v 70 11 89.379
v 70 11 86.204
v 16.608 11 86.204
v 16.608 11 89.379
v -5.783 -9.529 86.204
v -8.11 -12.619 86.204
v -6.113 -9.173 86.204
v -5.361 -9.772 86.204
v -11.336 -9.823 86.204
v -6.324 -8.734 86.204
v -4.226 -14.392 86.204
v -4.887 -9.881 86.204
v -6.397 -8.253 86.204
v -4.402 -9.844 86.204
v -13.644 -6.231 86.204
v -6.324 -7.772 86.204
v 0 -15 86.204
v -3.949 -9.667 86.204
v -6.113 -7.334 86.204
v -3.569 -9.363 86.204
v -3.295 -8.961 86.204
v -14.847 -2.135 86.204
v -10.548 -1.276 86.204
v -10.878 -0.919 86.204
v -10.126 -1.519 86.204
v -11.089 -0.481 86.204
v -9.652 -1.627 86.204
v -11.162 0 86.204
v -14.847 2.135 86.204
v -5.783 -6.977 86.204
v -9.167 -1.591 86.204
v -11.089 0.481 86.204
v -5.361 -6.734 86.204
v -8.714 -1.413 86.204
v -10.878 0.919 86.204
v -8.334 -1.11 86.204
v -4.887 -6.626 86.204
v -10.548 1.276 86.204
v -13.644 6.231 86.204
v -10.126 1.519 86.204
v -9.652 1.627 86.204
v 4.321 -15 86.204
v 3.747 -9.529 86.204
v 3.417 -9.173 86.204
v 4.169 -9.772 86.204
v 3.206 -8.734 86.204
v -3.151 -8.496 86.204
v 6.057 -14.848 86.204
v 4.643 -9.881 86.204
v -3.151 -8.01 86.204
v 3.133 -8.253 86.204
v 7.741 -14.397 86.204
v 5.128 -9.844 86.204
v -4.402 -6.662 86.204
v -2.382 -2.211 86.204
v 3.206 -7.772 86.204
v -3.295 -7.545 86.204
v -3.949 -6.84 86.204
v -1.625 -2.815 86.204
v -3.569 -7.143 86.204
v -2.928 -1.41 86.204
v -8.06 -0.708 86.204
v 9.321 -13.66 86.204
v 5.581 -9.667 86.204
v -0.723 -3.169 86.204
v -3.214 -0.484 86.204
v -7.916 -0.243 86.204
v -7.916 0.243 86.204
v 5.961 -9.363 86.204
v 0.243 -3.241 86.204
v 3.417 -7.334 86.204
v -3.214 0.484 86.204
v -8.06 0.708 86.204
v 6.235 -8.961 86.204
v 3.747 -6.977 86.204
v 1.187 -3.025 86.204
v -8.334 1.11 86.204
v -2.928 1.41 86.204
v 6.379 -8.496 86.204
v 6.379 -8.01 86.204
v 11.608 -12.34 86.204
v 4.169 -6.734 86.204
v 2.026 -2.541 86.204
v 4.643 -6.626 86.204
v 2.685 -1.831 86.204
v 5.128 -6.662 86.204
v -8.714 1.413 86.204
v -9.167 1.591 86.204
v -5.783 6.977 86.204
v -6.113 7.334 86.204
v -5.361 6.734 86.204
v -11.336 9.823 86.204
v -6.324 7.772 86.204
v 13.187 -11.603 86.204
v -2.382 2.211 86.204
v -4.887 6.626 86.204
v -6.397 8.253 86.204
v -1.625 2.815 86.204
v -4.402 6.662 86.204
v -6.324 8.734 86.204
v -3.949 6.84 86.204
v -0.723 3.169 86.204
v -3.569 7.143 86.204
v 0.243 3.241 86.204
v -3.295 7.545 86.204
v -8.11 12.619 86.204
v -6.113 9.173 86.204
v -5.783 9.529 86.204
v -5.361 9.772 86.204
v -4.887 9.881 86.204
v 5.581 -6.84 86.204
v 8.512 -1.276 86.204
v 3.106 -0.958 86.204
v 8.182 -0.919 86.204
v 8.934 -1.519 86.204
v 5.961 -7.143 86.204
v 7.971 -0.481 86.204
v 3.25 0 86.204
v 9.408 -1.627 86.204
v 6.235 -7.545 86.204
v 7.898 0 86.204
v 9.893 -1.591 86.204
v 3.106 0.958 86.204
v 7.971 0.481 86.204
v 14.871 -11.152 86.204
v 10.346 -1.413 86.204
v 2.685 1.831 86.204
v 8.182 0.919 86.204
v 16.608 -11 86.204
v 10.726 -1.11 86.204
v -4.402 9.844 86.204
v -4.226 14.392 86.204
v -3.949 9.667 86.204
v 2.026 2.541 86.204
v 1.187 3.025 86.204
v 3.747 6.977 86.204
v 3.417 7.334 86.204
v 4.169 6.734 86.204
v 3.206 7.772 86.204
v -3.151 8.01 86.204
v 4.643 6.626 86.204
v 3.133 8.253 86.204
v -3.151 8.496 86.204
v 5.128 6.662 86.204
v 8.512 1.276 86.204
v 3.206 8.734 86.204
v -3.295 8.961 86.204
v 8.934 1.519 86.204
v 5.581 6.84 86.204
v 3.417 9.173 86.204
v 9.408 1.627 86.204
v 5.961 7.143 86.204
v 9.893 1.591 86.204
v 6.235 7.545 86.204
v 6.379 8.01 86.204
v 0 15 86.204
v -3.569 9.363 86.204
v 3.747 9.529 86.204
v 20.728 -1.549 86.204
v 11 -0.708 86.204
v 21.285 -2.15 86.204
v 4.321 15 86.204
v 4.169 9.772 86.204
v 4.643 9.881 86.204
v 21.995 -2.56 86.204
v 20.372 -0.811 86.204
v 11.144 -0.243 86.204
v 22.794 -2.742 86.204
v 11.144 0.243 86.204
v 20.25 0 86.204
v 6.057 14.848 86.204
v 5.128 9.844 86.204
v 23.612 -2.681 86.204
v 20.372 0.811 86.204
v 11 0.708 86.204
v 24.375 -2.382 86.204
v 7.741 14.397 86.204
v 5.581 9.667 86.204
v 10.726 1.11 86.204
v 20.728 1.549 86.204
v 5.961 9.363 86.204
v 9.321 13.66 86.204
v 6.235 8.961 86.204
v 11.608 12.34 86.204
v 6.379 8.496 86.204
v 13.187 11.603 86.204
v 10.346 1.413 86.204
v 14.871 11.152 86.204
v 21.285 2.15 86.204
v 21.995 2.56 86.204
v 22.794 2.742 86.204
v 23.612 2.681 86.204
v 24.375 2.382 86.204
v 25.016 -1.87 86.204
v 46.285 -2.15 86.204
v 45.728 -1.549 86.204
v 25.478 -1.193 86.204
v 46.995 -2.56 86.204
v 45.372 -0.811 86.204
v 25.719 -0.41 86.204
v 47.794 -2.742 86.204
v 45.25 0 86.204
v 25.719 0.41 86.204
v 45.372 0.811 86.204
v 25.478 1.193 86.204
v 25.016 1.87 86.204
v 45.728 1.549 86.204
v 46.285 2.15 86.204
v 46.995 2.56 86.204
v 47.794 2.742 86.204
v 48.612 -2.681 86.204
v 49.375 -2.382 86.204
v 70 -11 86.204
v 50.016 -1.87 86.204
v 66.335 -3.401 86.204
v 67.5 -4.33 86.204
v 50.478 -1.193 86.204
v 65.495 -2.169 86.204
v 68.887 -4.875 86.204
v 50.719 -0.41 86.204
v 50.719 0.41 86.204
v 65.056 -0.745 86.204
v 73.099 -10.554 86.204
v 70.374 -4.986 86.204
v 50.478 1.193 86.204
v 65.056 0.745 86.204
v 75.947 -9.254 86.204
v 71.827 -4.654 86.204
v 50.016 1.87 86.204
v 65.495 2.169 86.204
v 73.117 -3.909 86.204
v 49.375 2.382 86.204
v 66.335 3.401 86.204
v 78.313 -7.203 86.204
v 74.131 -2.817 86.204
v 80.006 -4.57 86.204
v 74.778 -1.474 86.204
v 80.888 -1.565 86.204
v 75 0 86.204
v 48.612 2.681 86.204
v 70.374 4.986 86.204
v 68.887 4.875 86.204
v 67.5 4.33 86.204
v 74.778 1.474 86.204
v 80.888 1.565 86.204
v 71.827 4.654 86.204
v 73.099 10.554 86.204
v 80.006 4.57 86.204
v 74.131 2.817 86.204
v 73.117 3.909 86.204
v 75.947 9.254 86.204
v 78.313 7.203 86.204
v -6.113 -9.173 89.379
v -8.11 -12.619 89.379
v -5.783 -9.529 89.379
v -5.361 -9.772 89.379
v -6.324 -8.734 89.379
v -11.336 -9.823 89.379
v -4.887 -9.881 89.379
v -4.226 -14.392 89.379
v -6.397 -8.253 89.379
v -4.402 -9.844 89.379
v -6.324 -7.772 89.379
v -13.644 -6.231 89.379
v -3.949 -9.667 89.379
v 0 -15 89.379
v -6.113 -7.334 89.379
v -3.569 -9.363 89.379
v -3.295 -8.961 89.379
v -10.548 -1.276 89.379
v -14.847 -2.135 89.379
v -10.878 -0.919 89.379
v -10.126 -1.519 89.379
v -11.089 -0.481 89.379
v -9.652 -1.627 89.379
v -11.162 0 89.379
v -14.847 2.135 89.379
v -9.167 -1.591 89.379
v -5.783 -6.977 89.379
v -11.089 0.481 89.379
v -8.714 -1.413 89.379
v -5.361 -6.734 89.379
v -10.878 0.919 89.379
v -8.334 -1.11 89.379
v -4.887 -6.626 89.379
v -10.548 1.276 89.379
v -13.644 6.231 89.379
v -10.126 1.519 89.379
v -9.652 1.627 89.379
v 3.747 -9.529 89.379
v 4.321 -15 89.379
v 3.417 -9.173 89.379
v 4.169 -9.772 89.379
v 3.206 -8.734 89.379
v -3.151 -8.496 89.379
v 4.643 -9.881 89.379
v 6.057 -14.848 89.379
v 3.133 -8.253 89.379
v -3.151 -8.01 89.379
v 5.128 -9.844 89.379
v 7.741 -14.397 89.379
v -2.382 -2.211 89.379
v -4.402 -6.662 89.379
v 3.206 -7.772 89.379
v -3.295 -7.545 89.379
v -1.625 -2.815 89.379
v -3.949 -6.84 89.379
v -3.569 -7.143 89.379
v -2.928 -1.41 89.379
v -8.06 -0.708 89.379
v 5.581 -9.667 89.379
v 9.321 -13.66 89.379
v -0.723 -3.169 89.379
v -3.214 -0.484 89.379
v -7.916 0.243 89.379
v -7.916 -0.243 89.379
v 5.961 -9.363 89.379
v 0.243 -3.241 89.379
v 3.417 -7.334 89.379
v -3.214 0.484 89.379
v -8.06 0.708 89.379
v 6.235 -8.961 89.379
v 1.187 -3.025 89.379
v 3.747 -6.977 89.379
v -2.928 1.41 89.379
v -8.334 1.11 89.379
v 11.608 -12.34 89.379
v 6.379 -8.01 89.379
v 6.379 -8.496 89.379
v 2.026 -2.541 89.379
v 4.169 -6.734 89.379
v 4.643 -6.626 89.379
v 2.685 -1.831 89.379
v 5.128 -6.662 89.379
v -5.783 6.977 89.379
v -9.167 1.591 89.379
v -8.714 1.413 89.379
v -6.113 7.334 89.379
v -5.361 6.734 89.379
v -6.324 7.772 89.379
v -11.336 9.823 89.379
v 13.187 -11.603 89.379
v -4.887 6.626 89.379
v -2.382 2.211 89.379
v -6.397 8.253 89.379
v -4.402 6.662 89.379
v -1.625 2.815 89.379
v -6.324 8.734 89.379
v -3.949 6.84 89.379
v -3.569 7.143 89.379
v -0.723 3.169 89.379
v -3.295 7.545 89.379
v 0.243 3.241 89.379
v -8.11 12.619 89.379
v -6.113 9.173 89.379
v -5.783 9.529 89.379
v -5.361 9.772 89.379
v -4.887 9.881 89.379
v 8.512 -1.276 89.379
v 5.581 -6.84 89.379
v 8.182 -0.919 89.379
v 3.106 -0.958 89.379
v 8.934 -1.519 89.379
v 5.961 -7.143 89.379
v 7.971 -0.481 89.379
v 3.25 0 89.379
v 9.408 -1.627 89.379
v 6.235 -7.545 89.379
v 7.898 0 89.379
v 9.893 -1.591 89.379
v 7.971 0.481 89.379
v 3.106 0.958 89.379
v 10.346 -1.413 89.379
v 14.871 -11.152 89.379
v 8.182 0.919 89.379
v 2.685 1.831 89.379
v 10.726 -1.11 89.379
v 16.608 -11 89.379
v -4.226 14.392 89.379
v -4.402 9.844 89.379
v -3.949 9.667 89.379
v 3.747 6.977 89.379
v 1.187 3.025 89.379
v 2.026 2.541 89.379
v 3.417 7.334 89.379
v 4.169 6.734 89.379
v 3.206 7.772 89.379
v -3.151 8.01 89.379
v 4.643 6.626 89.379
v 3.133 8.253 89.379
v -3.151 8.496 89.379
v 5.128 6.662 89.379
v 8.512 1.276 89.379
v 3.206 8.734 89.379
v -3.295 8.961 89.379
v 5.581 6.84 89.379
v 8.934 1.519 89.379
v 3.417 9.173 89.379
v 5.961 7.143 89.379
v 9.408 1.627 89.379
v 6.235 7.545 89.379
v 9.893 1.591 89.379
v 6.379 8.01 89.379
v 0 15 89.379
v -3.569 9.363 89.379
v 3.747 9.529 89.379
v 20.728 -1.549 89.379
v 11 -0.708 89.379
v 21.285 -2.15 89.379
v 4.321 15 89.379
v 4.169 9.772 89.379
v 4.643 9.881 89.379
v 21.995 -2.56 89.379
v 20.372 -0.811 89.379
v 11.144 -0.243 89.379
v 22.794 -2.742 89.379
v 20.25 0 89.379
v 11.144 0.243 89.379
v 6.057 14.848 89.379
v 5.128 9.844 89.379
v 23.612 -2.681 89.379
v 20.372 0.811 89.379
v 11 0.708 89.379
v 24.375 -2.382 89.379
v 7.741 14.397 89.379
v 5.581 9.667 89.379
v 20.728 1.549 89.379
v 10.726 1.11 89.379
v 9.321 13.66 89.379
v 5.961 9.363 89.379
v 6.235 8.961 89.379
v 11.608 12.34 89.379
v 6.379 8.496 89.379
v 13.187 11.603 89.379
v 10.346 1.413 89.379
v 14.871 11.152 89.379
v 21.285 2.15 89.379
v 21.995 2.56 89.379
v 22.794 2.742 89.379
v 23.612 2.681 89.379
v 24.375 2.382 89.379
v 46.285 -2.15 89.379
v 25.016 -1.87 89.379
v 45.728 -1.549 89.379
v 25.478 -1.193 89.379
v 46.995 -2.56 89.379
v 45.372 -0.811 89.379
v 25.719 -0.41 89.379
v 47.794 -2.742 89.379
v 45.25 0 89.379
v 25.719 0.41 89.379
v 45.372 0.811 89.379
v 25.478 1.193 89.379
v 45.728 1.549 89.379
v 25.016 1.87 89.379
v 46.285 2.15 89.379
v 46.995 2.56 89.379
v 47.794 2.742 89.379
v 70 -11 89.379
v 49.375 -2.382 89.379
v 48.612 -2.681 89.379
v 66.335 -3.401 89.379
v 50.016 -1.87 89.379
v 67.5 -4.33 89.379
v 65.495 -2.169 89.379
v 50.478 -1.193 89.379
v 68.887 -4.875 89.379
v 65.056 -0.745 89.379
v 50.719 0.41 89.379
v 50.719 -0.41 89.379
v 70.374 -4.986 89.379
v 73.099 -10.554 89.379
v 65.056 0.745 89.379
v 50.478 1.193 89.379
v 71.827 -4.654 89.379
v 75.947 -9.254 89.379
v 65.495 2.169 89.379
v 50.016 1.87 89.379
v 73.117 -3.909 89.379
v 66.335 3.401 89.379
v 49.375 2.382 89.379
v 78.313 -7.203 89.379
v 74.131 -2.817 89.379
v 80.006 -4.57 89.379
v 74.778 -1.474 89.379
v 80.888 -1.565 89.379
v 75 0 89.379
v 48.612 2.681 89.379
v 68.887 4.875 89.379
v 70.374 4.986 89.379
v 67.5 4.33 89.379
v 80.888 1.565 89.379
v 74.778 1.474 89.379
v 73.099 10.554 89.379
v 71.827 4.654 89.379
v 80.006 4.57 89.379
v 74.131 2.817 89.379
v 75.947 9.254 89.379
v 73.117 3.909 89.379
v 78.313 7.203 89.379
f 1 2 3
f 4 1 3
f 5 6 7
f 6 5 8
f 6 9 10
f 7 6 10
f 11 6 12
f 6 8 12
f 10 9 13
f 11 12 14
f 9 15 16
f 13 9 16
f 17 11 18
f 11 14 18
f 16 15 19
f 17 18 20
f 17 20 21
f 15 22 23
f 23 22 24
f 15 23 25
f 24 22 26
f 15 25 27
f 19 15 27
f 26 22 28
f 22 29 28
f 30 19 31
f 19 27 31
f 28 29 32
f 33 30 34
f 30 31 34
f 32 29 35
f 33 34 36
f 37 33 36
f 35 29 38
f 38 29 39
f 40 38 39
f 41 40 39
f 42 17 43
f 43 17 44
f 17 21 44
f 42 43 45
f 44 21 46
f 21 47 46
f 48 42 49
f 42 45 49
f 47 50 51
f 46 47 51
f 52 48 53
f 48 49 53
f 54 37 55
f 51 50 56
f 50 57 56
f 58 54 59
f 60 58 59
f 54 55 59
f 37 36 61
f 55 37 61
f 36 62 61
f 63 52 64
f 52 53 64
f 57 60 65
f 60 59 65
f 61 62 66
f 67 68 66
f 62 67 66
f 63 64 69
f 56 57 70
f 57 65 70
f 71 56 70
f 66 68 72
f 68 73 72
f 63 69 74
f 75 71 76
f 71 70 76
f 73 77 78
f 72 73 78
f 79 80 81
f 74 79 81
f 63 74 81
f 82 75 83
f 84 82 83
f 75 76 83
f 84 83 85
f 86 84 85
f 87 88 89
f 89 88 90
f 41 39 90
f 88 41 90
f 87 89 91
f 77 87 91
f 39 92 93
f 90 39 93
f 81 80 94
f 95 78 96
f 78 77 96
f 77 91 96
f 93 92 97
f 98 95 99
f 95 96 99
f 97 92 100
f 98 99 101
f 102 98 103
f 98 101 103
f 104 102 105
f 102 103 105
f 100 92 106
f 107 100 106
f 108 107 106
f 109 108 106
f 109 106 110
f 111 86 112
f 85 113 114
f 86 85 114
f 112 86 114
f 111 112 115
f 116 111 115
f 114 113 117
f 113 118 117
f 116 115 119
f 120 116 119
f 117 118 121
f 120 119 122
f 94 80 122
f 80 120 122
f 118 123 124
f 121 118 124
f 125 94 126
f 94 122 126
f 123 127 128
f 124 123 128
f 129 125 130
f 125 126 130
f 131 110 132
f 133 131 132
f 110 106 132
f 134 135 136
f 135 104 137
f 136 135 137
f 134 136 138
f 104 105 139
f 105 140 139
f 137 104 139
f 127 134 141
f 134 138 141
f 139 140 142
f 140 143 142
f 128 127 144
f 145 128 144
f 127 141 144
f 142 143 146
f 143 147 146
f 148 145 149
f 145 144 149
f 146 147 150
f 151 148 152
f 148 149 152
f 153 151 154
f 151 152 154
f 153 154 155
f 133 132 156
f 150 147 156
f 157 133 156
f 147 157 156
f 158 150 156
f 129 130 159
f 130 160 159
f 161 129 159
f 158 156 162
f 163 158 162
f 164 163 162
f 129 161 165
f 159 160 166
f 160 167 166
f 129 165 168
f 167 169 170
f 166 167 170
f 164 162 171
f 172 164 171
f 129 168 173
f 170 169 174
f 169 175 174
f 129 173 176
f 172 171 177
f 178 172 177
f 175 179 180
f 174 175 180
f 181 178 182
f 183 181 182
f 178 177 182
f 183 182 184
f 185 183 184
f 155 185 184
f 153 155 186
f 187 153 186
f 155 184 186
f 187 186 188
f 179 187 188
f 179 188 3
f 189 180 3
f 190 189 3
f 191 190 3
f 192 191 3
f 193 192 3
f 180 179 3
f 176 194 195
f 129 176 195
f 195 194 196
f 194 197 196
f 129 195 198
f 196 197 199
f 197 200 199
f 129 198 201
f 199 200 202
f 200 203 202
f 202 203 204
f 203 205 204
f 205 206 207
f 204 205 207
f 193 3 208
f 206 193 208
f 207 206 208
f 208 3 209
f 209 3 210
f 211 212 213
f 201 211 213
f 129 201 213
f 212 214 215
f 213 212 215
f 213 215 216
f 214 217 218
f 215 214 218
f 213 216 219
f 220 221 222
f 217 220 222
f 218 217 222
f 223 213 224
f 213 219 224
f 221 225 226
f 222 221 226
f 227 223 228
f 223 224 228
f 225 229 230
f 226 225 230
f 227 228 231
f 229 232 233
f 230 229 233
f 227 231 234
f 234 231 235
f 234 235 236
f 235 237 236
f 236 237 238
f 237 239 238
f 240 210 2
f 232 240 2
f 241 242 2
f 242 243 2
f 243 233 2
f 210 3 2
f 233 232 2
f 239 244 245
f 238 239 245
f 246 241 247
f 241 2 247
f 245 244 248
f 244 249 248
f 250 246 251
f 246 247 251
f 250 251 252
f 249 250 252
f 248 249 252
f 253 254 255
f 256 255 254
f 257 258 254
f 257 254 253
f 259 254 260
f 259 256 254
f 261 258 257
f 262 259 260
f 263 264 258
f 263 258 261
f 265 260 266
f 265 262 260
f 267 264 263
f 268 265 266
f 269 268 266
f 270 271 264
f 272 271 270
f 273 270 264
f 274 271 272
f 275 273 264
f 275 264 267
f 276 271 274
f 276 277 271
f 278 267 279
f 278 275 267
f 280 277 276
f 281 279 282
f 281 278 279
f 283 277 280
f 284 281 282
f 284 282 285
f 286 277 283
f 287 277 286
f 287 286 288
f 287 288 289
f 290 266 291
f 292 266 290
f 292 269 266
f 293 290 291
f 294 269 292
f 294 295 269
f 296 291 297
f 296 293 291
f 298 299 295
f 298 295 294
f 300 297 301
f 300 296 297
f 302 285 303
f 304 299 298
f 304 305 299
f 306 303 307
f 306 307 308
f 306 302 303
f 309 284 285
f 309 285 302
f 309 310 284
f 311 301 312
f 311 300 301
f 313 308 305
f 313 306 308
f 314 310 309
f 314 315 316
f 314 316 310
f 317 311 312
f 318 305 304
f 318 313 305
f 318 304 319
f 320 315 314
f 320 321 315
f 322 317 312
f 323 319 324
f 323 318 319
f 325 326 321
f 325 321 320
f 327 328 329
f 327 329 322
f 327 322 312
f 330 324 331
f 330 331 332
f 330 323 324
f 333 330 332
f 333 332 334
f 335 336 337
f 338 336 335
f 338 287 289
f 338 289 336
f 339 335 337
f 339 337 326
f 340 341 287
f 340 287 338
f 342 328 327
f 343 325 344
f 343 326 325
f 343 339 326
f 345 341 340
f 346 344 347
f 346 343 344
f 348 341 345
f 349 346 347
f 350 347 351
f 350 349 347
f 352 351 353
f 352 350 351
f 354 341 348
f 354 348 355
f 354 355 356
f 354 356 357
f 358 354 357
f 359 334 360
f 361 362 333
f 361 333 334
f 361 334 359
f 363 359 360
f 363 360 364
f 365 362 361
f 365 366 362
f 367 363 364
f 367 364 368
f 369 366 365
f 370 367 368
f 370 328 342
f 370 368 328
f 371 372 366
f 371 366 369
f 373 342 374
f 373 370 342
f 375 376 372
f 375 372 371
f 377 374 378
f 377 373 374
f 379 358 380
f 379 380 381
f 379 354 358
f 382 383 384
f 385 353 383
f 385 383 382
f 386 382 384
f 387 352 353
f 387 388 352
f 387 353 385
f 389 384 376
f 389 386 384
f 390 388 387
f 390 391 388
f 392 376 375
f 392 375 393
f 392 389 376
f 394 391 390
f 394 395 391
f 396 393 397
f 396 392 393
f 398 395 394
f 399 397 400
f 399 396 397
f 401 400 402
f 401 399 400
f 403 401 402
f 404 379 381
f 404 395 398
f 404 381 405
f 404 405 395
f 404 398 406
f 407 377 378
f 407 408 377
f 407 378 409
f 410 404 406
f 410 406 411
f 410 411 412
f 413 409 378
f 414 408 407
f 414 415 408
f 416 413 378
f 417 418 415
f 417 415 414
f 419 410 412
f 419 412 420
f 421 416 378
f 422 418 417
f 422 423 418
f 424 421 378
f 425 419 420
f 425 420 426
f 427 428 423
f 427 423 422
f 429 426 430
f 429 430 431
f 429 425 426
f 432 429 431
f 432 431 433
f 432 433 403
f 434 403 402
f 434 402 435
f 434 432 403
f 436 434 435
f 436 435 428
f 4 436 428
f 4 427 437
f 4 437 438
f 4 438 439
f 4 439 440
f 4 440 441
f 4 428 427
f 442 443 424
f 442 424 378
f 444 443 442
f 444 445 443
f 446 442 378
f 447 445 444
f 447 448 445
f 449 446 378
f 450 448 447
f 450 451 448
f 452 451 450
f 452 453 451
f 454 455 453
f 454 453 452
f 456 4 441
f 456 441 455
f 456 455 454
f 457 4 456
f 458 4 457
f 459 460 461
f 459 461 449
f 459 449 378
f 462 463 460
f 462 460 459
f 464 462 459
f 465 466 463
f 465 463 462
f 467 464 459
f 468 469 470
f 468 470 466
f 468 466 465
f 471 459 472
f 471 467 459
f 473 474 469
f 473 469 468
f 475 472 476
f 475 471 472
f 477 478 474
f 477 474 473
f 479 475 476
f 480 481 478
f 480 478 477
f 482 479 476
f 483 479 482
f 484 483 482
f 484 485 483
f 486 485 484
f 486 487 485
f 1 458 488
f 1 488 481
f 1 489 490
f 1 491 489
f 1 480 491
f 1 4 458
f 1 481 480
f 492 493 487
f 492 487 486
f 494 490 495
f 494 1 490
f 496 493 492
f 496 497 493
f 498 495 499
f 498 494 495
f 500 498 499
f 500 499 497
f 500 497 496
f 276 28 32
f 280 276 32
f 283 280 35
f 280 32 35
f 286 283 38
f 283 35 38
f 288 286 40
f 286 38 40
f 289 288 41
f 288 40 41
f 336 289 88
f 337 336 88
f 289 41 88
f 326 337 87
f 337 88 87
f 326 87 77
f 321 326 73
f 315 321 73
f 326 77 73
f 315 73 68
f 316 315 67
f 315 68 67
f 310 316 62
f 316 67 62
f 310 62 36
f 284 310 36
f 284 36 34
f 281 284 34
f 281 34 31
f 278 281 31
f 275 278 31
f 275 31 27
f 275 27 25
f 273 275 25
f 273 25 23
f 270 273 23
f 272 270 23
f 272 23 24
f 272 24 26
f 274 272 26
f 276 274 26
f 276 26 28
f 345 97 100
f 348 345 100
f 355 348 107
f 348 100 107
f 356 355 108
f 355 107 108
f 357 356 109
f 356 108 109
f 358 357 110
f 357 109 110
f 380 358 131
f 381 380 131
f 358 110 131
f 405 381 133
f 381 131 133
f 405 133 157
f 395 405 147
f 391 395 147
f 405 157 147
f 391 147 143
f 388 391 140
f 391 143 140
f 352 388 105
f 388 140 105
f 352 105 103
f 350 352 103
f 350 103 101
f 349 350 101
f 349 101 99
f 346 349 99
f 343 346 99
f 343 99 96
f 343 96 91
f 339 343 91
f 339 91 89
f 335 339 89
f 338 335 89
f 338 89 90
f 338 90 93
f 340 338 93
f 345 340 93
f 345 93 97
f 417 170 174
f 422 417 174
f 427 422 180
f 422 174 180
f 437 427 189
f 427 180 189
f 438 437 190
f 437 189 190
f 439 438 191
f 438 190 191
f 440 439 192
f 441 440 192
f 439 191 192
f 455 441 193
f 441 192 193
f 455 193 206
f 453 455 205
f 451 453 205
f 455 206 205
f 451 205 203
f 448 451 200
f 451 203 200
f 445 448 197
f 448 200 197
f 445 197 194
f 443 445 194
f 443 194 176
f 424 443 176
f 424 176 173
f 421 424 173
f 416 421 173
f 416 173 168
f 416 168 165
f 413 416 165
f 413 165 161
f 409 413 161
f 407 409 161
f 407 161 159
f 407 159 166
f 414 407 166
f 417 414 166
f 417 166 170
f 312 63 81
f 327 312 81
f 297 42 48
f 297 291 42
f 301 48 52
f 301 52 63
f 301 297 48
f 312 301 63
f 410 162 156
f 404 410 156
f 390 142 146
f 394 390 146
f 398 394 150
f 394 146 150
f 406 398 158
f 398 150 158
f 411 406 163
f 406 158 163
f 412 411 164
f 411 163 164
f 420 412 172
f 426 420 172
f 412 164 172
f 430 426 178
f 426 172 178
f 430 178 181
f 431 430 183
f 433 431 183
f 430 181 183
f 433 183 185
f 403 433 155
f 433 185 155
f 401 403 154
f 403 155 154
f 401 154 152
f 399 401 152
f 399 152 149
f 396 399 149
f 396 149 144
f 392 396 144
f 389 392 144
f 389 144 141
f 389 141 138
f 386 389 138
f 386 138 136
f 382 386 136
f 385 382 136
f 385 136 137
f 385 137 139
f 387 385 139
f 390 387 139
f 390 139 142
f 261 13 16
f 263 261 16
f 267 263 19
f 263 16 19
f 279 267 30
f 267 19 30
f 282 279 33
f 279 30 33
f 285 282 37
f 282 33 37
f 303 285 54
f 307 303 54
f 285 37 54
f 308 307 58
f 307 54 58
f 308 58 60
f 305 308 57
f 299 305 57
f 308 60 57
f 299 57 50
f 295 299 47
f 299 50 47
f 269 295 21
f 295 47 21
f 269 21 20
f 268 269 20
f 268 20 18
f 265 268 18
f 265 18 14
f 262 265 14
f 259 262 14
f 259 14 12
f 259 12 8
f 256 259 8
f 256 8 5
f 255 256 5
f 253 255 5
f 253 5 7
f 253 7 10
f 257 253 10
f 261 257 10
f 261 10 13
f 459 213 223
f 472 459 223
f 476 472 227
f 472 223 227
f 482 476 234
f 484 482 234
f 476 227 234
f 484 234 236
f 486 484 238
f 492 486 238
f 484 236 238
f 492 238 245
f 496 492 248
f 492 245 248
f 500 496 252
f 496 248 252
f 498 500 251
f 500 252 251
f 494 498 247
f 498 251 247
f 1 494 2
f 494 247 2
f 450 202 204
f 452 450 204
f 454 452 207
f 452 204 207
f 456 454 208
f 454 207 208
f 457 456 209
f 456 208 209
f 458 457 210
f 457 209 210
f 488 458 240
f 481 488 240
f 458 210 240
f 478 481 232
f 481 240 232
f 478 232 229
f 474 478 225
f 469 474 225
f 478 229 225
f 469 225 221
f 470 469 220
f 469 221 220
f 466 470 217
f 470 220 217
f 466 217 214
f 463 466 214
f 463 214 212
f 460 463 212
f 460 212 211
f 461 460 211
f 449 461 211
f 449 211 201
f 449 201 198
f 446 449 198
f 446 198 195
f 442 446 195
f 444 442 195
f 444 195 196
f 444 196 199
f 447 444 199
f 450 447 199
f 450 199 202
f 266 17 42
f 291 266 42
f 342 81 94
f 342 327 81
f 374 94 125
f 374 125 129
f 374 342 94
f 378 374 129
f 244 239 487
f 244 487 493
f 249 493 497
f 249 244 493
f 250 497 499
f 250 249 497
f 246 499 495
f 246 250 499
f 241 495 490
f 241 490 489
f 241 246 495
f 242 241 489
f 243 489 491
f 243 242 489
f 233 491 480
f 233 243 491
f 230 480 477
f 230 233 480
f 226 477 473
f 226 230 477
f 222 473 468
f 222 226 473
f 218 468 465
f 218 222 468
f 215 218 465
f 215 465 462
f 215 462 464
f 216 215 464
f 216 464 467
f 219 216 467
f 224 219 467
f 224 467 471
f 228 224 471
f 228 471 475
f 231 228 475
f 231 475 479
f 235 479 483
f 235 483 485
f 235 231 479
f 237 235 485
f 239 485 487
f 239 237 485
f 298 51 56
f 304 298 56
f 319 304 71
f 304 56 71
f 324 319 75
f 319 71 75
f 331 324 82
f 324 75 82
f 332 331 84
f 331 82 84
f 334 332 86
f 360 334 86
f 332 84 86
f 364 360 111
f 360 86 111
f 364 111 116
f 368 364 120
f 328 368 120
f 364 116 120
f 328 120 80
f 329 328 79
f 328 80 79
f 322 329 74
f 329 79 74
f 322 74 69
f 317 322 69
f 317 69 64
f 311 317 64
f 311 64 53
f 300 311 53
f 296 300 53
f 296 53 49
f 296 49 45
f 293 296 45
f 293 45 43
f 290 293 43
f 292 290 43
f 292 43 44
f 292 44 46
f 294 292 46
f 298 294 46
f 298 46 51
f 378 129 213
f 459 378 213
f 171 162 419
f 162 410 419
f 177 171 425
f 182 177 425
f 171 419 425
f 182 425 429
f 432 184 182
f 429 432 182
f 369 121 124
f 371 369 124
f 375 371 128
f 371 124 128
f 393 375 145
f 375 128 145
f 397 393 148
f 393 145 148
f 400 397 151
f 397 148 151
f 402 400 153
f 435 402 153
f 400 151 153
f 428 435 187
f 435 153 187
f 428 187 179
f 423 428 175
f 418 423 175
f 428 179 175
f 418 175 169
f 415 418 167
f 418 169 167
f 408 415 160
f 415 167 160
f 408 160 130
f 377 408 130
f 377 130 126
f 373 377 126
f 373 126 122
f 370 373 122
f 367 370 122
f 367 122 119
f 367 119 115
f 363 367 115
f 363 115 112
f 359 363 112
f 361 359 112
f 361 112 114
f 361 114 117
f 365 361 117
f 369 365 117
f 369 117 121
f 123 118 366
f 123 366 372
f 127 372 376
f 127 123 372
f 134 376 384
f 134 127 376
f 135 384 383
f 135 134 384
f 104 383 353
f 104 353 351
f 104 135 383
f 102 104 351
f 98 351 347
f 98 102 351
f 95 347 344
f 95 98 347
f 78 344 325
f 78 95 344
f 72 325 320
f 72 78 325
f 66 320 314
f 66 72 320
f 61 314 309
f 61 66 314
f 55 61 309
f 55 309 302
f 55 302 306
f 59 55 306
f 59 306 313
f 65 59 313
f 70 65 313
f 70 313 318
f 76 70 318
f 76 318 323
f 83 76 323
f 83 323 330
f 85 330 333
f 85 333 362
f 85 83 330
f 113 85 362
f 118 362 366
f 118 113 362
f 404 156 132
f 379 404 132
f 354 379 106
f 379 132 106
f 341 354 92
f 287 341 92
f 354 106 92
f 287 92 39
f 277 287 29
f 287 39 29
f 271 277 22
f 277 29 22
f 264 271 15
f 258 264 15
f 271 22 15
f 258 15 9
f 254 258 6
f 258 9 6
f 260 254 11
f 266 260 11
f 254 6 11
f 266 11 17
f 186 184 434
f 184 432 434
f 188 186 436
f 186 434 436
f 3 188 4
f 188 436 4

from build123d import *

# Parameters (mm, degrees)
CROQUIS1_R                       = 5
CROQUIS1_R_2                     = 3.25
SALIENTE_EXTRUIR1_DEPTH          = 3.175
TALADRO_DE_MARGEN_PARA_41_D      = 3.2639
TALADRO_DE_MARGEN_PARA_41_DEPTH  = 10
TALADRO_DE_MARGEN_PARA_41_TIP    = 0.980574487
TALADRO_DE_MARGEN_PARA_M51_D     = 5.5
TALADRO_DE_MARGEN_PARA_M51_DEPTH = 6
TALADRO_DE_MARGEN_PARA_M51_TIP   = 1.652366702
REDONDEO1_R                      = 10


with BuildPart() as part:
    # Croquis1 → Saliente-Extruir1 (new body)
    with BuildSketch(Plane.XY.offset(86.203907482)):
        with BuildLine():
            Line((0, -15), (7, -15))
            Line((7, -15), (13.92820323, -11))
            Line((13.92820323, -11), (70, -11))
            ThreePointArc((70, -11), (81, 0), (70, 11))
            Line((70, 11), (13.92820323, 11))
            Line((13.92820323, 11), (7, 15))
            Line((7, 15), (0, 15))
            ThreePointArc((0, 15), (-15, 0), (0, -15))
        make_face()
        with Locations((70, 0)):
            Circle(CROQUIS1_R, mode=Mode.SUBTRACT)
        Circle(CROQUIS1_R_2, mode=Mode.SUBTRACT)
    extrude(amount=SALIENTE_EXTRUIR1_DEPTH)

    # Taladro de margen para #41
    with Locations(Plane.XY.offset(89.378907482)):
        with Locations((9.53, 0), (4.765, -8.253222098), (-4.765, -8.253222098), (-9.53, 0), (-4.765, 8.253222098), (4.765, 8.253222098)):
            Hole(TALADRO_DE_MARGEN_PARA_41_D / 2, depth=TALADRO_DE_MARGEN_PARA_41_DEPTH)
            with Locations((0, 0, -(TALADRO_DE_MARGEN_PARA_41_DEPTH + TALADRO_DE_MARGEN_PARA_41_TIP / 2))):  # 118° drill point
                Cone(0, TALADRO_DE_MARGEN_PARA_41_D / 2, TALADRO_DE_MARGEN_PARA_41_TIP, mode=Mode.SUBTRACT)

    # Taladro de margen para M51
    with Locations(Plane.XY.offset(89.378907482)):
        with Locations((23, 0), (48, 0)):
            Hole(TALADRO_DE_MARGEN_PARA_M51_D / 2, depth=TALADRO_DE_MARGEN_PARA_M51_DEPTH)
            with Locations((0, 0, -(TALADRO_DE_MARGEN_PARA_M51_DEPTH + TALADRO_DE_MARGEN_PARA_M51_TIP / 2))):  # 118° drill point
                Cone(0, TALADRO_DE_MARGEN_PARA_M51_D / 2, TALADRO_DE_MARGEN_PARA_M51_TIP, mode=Mode.SUBTRACT)

    # Redondeo1
    redondeo1_edges = [part.edges().sort_by_distance(p)[0] for p in [
        (7, 15, 87.791407482),
        (13.92820323, 11, 87.791407482),
        (13.92820323, -11, 87.791407482),
        (7, -15, 87.791407482),
    ]]
    fillet(redondeo1_edges, radius=REDONDEO1_R)


solid = part.part
